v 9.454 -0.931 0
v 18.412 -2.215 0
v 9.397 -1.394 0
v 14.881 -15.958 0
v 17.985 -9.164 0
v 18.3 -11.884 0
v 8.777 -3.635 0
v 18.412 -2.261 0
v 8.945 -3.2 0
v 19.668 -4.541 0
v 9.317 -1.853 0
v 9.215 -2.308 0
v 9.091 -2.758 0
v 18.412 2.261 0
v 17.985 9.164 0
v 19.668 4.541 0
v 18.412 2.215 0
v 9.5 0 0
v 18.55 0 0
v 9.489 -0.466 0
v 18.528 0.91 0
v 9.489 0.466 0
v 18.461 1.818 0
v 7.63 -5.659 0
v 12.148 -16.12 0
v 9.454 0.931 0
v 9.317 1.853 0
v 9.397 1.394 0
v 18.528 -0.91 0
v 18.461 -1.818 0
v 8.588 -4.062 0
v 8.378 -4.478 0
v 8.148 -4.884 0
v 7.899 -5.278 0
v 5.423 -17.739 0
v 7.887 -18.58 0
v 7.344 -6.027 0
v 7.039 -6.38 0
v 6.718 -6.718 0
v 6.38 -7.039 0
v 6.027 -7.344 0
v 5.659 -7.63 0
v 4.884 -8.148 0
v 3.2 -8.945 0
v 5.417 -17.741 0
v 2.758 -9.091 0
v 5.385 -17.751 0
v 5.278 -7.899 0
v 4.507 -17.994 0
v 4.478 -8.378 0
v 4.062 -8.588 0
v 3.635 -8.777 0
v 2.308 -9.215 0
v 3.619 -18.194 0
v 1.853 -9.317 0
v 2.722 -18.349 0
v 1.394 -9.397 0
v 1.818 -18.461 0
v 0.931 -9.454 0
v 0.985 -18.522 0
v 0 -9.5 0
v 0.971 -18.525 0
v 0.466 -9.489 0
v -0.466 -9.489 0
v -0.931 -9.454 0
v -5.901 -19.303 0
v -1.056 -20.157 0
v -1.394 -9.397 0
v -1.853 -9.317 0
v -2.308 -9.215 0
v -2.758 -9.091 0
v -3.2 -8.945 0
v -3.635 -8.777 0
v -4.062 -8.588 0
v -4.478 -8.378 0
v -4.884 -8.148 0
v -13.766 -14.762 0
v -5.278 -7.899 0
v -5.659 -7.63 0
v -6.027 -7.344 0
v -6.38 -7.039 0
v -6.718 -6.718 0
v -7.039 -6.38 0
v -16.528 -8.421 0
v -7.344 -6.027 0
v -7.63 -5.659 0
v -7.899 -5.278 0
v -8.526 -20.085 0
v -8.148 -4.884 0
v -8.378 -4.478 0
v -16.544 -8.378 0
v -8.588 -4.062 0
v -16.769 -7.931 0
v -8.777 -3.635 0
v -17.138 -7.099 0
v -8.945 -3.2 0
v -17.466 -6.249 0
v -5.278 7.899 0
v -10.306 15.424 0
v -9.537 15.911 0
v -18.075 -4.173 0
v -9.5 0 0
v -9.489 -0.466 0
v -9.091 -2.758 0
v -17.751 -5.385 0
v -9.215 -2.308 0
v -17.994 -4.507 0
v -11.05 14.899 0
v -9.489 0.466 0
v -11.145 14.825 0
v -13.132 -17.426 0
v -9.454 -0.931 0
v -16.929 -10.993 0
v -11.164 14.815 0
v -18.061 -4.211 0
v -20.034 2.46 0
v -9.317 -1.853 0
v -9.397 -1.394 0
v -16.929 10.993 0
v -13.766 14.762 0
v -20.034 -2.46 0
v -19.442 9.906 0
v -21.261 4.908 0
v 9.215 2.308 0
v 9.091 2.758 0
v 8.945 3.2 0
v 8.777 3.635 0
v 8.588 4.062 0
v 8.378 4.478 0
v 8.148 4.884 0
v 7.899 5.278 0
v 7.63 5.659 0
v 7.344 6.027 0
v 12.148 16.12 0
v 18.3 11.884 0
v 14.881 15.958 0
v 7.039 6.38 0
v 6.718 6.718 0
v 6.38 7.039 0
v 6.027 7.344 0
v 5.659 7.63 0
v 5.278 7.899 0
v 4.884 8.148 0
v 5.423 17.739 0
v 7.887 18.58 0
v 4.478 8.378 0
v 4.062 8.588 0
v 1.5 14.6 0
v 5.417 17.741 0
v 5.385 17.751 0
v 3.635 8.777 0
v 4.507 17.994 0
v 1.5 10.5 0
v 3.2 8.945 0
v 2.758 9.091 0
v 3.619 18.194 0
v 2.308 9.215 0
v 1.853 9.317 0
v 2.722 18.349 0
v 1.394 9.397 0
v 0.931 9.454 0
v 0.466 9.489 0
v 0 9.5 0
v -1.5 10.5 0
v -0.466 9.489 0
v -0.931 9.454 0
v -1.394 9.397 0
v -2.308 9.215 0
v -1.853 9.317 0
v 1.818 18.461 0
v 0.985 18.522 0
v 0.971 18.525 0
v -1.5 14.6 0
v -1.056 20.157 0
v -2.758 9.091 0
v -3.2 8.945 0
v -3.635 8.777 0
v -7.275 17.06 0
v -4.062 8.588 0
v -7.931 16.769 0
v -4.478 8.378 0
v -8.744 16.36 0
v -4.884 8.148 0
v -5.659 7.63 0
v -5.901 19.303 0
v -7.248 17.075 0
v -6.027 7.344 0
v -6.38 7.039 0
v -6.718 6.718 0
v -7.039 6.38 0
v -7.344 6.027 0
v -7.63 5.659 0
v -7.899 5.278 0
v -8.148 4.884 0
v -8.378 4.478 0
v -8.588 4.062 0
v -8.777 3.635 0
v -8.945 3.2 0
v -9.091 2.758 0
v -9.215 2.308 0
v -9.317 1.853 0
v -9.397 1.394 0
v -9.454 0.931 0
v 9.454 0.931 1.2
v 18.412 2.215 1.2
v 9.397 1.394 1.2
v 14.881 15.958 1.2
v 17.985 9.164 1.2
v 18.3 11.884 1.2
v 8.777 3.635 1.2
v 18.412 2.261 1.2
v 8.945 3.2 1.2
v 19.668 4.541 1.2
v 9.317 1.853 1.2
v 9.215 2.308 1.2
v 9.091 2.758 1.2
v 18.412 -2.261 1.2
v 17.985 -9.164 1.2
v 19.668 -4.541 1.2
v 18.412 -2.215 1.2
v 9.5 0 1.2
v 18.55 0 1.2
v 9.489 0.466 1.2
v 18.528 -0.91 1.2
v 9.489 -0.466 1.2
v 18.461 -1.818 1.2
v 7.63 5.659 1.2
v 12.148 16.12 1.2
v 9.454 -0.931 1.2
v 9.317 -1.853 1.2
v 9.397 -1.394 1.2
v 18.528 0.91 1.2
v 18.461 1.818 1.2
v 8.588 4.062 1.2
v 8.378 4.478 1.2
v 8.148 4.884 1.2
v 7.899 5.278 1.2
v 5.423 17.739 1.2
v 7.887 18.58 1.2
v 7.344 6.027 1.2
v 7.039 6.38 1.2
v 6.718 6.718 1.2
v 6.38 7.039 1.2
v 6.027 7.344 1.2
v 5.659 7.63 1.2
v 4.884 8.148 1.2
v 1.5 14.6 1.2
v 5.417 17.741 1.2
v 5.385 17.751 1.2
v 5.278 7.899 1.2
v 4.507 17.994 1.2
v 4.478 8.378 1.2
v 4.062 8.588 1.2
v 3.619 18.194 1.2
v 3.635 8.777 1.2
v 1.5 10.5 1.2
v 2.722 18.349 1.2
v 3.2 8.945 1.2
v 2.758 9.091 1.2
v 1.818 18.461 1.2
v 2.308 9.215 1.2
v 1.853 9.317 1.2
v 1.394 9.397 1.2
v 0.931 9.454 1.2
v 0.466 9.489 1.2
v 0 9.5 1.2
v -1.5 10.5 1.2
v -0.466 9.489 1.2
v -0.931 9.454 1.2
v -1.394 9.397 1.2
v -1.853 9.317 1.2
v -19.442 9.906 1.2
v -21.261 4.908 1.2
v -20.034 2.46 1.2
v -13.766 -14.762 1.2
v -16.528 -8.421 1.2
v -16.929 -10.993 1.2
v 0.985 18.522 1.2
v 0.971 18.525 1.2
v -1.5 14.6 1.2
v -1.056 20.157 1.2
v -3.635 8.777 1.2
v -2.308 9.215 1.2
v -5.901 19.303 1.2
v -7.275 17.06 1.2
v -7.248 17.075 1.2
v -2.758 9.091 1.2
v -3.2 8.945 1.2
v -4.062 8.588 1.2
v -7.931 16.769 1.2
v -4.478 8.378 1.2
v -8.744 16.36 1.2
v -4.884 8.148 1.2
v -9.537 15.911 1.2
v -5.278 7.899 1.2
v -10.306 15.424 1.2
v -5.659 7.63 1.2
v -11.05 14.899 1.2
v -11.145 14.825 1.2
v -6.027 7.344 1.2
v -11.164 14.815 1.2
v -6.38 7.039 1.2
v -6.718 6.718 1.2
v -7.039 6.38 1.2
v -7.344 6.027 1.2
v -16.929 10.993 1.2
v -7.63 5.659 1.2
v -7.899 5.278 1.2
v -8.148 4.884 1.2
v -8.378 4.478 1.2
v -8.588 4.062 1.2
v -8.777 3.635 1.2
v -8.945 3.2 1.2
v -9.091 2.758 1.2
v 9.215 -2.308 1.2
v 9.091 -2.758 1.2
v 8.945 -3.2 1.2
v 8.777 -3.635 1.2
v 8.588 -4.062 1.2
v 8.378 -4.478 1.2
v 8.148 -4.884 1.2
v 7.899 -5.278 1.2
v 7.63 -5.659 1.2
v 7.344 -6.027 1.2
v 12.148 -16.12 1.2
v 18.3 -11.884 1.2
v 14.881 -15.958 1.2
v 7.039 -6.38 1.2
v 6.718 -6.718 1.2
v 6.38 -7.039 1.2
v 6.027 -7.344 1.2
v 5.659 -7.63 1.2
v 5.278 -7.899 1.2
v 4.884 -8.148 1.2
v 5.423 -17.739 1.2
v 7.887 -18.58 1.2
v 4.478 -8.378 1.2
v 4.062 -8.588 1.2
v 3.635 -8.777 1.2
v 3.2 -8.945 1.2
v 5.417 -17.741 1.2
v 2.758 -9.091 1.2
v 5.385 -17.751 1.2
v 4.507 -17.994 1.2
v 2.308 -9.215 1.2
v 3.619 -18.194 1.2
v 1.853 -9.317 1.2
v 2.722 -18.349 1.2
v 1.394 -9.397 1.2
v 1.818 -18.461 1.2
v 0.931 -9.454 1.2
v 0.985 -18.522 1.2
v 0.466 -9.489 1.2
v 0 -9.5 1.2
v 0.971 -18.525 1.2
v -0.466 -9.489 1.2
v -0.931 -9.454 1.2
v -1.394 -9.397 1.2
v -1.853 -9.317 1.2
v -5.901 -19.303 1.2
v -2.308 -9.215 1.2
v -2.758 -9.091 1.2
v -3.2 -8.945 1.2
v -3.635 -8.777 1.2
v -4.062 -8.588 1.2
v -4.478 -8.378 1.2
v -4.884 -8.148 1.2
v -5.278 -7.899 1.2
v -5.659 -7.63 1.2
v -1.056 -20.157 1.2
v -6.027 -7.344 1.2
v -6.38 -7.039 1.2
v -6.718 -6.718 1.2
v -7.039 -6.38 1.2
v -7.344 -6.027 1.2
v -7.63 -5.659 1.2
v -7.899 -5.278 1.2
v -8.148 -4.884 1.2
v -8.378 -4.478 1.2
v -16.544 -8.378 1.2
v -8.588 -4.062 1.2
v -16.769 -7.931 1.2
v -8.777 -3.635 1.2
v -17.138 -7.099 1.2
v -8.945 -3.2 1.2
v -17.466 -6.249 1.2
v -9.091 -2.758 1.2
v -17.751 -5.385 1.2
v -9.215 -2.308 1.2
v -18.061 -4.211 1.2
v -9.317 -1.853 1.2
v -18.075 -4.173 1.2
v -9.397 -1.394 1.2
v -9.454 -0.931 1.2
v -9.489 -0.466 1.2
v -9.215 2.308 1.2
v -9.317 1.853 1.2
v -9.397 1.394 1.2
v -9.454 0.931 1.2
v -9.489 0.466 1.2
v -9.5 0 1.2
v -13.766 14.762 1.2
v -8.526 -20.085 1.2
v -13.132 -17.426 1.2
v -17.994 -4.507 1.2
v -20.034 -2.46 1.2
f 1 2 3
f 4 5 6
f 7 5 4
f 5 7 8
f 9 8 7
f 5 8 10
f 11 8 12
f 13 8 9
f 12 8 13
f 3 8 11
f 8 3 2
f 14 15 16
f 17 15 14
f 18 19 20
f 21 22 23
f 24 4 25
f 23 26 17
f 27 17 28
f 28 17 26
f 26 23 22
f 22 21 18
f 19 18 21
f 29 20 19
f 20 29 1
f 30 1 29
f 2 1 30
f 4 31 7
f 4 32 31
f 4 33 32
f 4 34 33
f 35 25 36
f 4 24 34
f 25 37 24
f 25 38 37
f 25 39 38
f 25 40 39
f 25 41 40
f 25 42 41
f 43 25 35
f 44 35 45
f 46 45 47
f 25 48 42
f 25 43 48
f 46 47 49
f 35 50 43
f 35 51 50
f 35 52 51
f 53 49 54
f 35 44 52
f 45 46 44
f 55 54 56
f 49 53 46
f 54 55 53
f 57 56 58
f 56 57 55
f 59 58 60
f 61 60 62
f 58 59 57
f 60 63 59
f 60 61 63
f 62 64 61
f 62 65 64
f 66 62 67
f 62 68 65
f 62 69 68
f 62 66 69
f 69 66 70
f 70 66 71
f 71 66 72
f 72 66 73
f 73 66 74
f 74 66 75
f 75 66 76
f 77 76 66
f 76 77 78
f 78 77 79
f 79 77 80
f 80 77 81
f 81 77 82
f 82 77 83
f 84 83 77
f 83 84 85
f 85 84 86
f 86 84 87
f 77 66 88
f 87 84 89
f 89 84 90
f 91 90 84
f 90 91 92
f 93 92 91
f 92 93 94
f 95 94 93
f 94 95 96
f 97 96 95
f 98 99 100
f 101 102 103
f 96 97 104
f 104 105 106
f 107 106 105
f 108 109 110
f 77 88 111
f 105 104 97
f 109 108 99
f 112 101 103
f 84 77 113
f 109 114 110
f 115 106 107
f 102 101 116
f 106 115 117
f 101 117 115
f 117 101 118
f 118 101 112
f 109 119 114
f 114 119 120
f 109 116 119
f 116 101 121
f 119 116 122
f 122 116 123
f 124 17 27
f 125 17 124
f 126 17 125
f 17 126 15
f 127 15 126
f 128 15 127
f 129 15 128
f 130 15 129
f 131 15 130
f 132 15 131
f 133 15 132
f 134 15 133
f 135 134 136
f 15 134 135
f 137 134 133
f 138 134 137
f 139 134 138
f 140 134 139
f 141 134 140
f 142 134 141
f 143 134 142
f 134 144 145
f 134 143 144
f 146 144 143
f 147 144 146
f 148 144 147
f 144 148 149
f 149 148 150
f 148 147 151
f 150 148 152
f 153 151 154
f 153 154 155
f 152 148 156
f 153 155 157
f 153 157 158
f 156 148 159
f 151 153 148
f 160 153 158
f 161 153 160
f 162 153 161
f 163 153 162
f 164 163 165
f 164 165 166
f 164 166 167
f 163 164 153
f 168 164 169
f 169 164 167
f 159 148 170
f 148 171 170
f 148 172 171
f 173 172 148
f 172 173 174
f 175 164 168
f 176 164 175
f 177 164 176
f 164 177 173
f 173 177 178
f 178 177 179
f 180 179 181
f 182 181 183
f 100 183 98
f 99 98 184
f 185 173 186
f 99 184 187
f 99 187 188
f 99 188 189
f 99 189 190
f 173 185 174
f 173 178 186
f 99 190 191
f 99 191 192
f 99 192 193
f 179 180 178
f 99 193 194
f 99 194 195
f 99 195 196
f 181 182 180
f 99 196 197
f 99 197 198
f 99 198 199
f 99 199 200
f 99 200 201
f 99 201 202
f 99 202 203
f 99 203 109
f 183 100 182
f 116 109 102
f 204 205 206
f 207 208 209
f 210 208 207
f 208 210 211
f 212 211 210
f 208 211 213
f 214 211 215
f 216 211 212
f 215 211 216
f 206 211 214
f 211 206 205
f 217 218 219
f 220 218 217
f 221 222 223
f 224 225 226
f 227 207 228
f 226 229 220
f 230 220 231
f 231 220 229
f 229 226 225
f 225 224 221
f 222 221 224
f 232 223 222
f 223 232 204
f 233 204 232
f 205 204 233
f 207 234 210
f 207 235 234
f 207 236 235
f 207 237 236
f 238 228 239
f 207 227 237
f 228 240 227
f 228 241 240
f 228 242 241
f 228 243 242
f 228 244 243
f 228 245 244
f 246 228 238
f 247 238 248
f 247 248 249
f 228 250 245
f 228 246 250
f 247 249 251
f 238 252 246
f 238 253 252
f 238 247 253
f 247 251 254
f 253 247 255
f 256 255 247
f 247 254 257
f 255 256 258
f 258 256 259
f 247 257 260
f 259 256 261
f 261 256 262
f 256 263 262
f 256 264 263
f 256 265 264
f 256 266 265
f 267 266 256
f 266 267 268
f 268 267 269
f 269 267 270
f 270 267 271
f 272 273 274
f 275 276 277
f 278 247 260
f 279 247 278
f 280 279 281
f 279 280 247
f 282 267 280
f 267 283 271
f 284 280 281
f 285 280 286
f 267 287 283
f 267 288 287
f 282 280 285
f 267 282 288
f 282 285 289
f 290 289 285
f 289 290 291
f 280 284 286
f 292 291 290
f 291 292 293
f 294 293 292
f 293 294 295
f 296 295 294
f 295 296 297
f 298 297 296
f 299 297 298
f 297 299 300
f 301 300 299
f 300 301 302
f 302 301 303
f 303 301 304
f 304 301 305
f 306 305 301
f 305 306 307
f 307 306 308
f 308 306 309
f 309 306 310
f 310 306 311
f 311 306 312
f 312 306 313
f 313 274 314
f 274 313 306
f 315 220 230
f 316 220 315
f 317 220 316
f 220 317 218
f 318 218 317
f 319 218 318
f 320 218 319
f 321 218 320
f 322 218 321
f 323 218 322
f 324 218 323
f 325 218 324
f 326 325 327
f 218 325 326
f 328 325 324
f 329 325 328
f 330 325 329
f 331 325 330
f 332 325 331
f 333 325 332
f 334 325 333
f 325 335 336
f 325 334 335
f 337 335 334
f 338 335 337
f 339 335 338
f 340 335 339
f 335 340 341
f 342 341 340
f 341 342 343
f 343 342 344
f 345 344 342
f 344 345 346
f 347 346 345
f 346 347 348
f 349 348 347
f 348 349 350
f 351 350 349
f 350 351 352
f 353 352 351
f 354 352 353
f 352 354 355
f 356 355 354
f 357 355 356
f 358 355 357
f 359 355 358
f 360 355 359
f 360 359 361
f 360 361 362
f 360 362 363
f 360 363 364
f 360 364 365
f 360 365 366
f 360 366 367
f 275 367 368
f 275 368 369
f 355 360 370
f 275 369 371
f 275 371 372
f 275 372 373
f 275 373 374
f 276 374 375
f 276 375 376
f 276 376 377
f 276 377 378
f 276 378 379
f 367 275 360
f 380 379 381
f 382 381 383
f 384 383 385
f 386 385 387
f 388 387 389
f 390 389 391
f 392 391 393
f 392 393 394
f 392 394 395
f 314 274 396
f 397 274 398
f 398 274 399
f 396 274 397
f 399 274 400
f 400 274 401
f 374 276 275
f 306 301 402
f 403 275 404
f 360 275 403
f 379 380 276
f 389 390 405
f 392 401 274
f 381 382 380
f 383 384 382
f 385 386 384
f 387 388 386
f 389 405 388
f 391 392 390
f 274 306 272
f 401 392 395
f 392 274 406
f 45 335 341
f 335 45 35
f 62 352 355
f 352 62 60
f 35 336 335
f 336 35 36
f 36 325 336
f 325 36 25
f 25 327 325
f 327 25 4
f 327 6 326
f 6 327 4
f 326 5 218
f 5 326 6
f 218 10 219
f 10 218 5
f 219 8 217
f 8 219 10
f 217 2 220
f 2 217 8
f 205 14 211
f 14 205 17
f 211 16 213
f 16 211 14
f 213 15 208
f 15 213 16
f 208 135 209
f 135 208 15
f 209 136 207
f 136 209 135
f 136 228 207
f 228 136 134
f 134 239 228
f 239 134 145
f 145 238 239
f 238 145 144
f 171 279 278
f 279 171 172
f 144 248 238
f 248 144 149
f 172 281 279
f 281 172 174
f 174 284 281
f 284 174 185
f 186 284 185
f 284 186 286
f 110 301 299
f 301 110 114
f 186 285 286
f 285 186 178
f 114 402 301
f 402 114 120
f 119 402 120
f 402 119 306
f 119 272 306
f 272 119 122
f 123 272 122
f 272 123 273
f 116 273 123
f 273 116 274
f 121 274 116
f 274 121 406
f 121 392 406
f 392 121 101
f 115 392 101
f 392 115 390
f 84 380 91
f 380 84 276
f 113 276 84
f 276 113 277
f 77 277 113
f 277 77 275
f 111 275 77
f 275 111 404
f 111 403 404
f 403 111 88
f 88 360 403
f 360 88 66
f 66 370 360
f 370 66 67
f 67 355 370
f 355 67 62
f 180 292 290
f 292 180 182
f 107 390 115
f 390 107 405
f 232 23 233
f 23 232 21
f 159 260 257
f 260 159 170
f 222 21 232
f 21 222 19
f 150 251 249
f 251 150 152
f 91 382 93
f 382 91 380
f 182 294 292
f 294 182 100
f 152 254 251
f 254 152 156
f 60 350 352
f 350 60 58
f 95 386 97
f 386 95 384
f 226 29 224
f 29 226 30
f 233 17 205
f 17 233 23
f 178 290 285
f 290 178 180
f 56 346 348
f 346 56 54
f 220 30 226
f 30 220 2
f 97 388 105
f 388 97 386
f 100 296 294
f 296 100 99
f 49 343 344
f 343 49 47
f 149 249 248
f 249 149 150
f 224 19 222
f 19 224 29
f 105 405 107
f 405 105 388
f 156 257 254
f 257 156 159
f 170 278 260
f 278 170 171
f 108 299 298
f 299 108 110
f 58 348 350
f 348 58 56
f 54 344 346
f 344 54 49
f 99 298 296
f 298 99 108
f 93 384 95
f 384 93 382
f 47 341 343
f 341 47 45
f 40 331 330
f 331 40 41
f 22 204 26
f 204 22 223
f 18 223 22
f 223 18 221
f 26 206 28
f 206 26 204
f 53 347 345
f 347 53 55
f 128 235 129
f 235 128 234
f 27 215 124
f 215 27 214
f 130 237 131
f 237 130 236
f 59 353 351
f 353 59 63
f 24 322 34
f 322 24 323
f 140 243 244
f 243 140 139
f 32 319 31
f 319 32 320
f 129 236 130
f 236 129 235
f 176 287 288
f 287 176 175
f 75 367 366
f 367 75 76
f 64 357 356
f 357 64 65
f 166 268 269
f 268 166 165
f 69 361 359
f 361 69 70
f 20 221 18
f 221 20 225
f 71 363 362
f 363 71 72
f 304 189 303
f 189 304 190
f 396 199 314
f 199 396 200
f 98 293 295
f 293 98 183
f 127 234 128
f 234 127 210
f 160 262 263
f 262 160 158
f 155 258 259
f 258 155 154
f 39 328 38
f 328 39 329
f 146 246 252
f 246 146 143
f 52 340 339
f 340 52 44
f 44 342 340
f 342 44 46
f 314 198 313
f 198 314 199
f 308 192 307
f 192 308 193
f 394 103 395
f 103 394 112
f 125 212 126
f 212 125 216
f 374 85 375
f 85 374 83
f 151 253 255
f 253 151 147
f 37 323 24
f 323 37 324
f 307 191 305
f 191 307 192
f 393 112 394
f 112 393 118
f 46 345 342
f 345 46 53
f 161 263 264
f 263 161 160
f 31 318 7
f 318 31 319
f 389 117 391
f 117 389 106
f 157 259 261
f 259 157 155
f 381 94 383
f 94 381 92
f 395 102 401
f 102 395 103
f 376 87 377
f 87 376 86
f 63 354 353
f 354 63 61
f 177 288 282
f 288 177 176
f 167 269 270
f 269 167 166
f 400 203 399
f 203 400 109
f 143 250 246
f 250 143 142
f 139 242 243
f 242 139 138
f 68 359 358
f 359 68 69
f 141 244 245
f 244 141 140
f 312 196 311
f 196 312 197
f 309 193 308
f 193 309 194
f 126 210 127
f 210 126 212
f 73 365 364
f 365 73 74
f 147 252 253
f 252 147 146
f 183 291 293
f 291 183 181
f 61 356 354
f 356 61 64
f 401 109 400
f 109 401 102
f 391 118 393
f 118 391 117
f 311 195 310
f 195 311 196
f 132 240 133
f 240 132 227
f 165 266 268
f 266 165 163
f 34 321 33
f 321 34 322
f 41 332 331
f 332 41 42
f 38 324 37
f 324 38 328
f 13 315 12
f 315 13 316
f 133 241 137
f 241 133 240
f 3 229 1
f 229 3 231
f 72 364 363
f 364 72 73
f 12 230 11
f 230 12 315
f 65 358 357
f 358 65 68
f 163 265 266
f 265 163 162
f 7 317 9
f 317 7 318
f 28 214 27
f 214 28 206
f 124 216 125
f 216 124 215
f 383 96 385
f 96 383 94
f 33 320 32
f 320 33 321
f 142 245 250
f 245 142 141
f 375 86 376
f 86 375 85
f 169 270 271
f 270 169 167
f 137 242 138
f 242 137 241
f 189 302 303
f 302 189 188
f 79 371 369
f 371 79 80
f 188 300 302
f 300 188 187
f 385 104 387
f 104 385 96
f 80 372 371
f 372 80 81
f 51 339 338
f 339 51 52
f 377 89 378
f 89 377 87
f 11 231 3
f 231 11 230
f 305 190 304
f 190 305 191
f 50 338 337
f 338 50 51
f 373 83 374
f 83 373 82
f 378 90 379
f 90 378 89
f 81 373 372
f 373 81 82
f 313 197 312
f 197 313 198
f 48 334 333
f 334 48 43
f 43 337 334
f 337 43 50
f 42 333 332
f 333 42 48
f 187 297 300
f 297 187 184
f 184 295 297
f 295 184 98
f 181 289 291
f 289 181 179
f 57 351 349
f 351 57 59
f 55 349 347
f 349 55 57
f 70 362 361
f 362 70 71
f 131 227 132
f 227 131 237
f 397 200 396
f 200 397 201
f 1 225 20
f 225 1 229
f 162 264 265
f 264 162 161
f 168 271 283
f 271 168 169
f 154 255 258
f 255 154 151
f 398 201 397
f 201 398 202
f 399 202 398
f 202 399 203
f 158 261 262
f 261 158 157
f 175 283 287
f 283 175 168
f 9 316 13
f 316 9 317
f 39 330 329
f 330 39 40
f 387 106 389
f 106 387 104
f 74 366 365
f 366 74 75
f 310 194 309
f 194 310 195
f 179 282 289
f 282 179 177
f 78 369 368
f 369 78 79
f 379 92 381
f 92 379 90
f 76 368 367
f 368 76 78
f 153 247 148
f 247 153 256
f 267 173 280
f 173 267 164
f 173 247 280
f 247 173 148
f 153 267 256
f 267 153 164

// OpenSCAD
/*
  Elna Supermatic cam 06
  Name: Wide zigzag
  Status: candidate

  Generated from measured parametric base v2.
  Surface mode: stepped
*/

include <_elna_measured_common.scad>;

profile_points = [
        [0.9708, 18.5246],
        [5.4235, 17.7395],
        [7.8869, 18.5804],
        [12.1476, 16.1205],
        [14.8812, 15.9581],
        [18.2998, 11.8840],
        [17.9850, 9.1638],
        [19.6677, 4.5406],
        [18.4117, 2.2607],
        [18.4117, -2.2607],
        [19.6677, -4.5406],
        [17.9850, -9.1638],
        [18.2998, -11.8840],
        [14.8812, -15.9581],
        [12.1476, -16.1205],
        [7.8869, -18.5804],
        [5.4235, -17.7395],
        [0.9708, -18.5246],
        [-1.0564, -20.1573],
        [-5.9015, -19.3030],
        [-8.5258, -20.0854],
        [-13.1316, -17.4262],
        [-13.7661, -14.7624],
        [-16.9286, -10.9935],
        [-16.5282, -8.4215],
        [-18.0746, -4.1728],
        [-20.0345, -2.4599],
        [-20.0345, 2.4599],
        [-21.2608, 4.9084],
        [-19.4418, 9.9061],
        [-16.9286, 10.9935],
        [-13.7661, 14.7624],
        [-11.1637, 14.8147],
        [-7.2481, 17.0754],
        [-5.9015, 19.3030],
        [-1.0564, 20.1573]
];

icon_points = [[-1.000,0.040], [-0.889,0.960], [-0.778,0.040], [-0.667,0.960], [-0.556,0.040], [-0.444,0.960], [-0.333,0.040], [-0.222,0.960], [-0.111,0.040], [0.000,0.960], [0.111,0.040], [0.222,0.960], [0.333,0.040], [0.444,0.960], [0.556,0.040], [0.667,0.960], [0.778,0.040], [0.889,0.960], [1.000,0.040]];

elna_cam_ring(profile_points=profile_points);
